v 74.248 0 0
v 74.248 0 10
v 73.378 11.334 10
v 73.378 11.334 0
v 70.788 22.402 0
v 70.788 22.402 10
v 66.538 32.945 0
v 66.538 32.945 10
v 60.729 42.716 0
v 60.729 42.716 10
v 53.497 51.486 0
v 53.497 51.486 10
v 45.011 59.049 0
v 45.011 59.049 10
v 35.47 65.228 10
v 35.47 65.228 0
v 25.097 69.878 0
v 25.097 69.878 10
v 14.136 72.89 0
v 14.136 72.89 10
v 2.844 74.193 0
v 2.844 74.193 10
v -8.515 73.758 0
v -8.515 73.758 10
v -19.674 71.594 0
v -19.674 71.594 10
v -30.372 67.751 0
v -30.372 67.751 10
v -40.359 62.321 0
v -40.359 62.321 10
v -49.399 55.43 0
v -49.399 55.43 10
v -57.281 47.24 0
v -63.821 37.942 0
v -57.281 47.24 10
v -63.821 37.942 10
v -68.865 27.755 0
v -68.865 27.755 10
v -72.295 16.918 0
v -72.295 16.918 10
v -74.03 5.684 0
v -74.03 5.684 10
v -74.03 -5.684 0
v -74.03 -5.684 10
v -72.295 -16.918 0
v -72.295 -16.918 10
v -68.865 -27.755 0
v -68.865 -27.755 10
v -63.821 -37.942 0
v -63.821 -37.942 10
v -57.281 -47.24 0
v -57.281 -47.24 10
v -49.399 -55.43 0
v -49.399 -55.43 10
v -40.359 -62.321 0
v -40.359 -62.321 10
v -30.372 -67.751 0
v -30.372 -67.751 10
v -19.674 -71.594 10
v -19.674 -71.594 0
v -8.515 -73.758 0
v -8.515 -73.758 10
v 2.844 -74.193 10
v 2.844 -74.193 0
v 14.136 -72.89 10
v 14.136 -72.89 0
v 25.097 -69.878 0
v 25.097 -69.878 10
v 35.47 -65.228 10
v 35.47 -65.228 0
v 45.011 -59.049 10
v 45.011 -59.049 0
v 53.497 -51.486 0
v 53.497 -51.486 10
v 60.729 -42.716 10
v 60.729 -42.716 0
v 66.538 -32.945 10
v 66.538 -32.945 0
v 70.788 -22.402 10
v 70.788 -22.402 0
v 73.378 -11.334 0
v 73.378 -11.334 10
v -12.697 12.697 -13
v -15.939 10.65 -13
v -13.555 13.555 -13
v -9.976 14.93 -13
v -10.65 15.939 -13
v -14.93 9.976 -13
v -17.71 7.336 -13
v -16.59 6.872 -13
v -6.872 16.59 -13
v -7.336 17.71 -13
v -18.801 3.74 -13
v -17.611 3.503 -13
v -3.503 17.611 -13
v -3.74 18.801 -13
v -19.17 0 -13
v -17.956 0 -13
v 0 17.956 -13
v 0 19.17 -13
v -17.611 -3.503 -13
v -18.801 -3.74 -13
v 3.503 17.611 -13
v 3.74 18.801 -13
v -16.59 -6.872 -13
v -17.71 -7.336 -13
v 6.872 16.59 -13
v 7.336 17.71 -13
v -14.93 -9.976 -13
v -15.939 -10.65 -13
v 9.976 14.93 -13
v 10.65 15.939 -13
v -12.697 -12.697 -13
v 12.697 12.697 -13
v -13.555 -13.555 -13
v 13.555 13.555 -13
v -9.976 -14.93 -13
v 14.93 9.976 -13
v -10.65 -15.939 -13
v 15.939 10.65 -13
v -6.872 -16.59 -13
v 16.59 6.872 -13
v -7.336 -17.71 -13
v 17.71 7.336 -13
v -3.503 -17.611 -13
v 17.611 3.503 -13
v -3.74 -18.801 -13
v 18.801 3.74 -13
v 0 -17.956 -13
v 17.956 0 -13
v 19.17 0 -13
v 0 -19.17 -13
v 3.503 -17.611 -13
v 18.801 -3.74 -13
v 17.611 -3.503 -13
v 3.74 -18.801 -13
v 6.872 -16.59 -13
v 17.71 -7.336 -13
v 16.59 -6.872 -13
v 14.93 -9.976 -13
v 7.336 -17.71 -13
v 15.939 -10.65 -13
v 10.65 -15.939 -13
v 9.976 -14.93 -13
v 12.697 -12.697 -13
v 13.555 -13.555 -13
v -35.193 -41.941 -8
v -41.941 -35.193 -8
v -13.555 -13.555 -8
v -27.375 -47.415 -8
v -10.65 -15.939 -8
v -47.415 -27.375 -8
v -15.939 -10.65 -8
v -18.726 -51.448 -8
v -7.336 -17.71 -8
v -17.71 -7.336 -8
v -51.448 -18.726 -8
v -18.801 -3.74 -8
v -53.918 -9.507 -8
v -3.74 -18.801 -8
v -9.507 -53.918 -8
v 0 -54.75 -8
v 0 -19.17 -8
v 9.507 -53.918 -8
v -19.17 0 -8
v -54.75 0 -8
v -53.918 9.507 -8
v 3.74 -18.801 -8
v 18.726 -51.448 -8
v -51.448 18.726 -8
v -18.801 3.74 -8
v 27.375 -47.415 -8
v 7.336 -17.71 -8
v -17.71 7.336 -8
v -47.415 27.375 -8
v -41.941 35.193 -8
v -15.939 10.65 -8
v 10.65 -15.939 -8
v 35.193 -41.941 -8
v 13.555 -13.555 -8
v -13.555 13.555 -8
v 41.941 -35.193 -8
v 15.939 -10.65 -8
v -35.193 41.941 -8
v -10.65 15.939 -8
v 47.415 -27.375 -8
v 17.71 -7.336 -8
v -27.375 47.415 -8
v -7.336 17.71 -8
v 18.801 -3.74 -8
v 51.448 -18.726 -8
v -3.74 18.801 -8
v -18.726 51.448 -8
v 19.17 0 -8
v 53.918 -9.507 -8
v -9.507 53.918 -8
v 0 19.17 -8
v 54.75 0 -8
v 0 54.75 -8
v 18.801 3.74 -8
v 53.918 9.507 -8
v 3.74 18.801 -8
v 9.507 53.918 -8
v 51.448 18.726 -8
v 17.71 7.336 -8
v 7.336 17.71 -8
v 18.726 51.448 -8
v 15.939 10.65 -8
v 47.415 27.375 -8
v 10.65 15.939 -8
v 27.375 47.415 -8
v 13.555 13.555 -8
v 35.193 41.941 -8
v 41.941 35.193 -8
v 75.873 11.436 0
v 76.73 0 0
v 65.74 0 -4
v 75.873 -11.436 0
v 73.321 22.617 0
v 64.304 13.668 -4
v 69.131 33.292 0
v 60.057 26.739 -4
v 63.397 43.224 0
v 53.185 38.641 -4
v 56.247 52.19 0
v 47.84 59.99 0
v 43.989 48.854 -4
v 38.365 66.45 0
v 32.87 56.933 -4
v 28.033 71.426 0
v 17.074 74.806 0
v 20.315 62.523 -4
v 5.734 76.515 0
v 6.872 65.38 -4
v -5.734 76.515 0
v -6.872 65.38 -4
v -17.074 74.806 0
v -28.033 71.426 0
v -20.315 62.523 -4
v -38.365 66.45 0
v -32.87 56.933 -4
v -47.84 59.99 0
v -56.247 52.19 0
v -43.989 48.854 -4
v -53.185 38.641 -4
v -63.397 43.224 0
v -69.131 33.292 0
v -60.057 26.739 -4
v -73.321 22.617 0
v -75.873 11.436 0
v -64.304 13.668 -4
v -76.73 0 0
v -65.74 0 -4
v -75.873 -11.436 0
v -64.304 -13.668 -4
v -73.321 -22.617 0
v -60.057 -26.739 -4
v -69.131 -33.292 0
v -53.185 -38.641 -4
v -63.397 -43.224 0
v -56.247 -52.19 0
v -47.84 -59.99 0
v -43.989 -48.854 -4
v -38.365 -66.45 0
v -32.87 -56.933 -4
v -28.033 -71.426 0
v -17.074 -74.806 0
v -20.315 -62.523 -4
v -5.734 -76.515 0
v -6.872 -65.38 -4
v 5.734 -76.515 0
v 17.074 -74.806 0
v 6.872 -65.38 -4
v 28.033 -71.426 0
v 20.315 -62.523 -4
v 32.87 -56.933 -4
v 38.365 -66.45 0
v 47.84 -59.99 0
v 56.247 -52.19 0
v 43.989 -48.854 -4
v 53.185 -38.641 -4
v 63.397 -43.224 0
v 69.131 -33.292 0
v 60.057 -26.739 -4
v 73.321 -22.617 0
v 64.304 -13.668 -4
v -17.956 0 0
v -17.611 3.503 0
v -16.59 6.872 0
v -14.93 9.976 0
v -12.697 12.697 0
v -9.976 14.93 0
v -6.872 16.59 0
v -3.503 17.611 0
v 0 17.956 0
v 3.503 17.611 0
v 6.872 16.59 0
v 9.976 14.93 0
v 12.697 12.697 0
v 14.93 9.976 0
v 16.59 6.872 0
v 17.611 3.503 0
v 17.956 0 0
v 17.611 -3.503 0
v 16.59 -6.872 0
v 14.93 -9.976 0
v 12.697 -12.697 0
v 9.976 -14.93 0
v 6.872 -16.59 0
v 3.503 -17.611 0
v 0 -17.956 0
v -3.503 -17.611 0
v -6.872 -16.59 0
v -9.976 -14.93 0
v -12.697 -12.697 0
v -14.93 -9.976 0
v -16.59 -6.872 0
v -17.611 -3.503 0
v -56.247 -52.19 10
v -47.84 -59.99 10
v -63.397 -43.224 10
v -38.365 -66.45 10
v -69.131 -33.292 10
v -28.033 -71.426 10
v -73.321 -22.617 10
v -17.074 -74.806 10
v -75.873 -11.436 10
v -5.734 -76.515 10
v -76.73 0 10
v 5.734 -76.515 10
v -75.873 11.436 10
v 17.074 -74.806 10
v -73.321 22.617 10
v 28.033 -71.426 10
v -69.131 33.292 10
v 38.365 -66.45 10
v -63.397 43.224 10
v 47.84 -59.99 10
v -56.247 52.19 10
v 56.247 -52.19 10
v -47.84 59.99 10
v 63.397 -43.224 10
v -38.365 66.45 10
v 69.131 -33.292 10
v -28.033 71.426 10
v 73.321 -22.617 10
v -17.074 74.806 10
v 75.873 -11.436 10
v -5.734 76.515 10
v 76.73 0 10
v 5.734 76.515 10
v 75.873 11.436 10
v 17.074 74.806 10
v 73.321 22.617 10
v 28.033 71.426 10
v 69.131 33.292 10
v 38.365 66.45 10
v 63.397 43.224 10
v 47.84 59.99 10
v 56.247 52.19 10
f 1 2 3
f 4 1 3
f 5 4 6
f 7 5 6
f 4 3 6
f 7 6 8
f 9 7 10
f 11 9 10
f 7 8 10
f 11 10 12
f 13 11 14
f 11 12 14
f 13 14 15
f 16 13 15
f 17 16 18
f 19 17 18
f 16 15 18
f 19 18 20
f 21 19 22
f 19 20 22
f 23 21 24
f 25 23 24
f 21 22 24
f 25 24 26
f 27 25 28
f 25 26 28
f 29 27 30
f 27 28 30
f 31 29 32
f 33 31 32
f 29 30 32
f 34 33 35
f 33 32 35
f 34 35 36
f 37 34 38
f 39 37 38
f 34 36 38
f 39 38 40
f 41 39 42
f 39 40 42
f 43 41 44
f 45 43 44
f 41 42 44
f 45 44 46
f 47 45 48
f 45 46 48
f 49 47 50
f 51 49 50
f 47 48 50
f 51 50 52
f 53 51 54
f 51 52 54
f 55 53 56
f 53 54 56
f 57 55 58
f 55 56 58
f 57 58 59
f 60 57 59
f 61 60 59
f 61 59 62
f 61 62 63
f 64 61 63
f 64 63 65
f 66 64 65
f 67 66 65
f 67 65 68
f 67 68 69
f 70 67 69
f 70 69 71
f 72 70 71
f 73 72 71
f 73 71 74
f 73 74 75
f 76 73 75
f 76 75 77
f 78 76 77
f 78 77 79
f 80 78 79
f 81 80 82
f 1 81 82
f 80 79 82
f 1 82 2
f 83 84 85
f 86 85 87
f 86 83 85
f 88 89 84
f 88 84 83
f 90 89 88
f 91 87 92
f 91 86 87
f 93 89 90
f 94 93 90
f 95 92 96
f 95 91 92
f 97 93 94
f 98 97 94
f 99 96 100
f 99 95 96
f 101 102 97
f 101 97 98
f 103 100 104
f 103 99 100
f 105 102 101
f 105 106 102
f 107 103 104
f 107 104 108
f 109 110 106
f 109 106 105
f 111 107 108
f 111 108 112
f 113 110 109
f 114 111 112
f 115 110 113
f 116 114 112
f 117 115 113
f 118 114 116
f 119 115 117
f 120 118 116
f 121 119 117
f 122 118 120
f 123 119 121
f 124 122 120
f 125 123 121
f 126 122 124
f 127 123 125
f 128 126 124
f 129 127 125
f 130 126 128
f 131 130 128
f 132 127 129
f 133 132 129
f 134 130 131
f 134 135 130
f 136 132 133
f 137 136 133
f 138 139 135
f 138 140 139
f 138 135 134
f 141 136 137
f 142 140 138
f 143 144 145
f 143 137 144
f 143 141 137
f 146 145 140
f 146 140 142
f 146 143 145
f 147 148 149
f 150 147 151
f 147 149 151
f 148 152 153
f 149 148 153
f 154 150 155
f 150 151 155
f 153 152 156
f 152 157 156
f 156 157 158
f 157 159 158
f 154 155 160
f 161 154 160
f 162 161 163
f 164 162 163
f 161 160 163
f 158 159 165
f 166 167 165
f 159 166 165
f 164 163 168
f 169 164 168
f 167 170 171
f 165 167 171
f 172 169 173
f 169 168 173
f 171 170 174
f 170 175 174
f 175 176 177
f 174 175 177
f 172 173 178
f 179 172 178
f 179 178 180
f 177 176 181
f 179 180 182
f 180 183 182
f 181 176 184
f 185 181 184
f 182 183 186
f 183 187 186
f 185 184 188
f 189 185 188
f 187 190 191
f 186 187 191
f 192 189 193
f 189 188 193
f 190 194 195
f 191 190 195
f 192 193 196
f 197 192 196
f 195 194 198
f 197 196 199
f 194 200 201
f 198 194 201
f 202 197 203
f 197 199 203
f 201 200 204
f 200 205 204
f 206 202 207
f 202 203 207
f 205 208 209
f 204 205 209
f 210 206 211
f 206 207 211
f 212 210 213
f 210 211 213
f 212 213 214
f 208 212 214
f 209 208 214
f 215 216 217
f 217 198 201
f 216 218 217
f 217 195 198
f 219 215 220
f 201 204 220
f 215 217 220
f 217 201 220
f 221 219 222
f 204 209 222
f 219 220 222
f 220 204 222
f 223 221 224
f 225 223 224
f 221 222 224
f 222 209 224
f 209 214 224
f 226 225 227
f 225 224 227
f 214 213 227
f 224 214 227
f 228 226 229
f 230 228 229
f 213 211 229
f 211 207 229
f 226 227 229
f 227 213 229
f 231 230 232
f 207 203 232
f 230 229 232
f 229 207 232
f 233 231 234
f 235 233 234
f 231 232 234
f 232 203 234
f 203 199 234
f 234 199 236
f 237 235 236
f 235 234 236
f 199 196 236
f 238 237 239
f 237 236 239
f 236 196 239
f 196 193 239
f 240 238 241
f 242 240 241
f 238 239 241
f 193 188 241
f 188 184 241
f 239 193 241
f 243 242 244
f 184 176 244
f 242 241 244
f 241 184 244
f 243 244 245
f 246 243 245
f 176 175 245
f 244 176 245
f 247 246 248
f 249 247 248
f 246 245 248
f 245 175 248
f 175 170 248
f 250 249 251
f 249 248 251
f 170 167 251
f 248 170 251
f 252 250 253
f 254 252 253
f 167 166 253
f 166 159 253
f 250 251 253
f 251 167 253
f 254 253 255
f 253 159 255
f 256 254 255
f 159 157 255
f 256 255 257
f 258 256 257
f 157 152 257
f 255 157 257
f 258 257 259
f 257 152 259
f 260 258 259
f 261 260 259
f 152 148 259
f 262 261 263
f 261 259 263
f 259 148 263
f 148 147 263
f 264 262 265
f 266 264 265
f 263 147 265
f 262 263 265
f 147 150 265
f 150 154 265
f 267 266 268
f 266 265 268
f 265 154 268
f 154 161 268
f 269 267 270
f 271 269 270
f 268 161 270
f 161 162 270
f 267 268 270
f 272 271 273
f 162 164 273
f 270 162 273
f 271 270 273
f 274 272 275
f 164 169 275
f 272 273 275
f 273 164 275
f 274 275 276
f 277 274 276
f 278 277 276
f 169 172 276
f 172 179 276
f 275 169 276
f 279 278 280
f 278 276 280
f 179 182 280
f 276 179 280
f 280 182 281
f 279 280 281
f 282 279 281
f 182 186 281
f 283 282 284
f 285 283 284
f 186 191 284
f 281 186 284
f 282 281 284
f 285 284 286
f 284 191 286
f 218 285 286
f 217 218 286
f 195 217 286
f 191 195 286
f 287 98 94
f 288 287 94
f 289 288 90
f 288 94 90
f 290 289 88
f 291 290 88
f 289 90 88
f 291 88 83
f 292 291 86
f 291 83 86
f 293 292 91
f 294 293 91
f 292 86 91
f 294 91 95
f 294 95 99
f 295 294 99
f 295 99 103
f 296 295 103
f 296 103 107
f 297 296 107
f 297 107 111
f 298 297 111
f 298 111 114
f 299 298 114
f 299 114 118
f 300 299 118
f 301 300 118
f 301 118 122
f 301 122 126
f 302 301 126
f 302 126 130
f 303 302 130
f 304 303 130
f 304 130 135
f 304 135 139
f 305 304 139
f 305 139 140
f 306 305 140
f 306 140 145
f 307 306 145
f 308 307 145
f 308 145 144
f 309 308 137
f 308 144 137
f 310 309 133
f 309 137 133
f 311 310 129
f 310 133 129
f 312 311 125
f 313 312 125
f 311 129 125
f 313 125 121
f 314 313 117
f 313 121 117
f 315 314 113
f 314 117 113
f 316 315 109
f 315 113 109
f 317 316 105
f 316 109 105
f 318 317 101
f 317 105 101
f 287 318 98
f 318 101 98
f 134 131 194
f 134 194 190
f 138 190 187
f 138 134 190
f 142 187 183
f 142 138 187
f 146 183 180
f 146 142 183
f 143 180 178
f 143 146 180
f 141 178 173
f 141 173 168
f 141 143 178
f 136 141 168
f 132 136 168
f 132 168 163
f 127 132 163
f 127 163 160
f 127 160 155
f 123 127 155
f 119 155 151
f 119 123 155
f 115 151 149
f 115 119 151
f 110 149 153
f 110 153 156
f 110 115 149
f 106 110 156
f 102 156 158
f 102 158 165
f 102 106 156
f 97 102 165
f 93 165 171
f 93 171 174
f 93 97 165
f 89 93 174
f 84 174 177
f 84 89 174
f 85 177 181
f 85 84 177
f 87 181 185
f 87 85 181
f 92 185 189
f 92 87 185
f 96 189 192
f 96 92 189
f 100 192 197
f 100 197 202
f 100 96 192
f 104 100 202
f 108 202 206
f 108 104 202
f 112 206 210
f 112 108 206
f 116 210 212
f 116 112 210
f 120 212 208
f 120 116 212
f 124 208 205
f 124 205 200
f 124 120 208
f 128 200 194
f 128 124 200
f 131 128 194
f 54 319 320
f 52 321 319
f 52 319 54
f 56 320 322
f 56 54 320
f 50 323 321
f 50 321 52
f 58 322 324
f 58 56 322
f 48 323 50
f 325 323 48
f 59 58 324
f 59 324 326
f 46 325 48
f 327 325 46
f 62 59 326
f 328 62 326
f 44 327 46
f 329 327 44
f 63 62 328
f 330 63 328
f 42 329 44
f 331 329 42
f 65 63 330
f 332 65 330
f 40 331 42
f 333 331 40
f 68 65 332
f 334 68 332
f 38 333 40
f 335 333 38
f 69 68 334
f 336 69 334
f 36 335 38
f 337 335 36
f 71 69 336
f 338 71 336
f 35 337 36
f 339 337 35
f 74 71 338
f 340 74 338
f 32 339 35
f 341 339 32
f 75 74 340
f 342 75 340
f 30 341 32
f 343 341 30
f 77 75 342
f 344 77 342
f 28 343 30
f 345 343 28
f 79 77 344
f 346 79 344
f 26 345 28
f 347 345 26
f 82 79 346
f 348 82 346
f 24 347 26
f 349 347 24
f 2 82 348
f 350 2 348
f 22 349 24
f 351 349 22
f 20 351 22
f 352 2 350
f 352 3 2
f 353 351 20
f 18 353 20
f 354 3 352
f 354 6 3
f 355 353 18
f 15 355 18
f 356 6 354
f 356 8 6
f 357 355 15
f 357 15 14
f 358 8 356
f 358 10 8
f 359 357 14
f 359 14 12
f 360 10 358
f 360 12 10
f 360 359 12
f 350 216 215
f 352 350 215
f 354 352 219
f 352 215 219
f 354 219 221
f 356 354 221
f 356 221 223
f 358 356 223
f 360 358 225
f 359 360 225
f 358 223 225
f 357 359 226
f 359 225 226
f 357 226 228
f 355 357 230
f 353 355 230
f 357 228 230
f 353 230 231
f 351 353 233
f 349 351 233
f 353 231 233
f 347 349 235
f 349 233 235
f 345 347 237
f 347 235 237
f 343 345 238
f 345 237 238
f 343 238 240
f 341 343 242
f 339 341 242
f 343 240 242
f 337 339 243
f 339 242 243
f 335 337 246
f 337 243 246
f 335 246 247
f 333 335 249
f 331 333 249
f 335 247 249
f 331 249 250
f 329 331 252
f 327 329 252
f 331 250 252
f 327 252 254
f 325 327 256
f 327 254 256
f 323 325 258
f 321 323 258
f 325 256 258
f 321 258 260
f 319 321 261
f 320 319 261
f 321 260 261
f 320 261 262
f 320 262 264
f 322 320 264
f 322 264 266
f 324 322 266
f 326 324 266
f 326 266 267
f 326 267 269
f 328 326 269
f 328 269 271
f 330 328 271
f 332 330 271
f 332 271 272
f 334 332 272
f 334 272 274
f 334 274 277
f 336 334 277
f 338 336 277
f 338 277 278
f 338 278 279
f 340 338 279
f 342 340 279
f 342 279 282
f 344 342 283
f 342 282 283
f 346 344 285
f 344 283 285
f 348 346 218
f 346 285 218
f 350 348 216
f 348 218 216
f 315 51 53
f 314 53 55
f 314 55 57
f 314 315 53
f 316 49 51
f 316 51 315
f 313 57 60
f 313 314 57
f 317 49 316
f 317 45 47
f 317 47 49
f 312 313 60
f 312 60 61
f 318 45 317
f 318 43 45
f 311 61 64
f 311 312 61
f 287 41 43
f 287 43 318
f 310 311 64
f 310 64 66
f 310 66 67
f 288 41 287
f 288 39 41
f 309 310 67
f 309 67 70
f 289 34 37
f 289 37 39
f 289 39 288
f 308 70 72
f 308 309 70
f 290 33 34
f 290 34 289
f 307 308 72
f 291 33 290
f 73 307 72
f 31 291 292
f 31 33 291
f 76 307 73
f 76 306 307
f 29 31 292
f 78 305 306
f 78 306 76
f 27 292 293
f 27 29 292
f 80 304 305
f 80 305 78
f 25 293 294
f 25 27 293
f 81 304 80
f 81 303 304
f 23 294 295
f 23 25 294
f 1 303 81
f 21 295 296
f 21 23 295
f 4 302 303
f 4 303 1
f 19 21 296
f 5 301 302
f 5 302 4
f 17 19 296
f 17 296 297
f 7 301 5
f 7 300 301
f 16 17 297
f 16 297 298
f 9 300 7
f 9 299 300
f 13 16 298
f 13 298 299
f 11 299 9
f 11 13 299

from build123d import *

# Parameters (mm, degrees)
SKETCH1_R                     = 76.73
BOSS_EXTRUDE1_DEPTH           = 10
BOSS_EXTRUDE1_OTHER_WAY_DEPTH = 8
BOSS_EXTRUDE1_OTHER_WAY_TAPER = 70
SKETCH2_R                     = 17.9565
CUT_EXTRUDE1_DEPTH            = 18
SKETCH3_R                     = 74.247849381
CUT_EXTRUDE2_DEPTH            = 10
BOSS_EXTRUDE2_START           = 5
SKETCH4_R                     = 19.169573719
SKETCH4_R_2                   = 17.9565
BOSS_EXTRUDE2_DEPTH           = 5


with BuildPart() as part:
    # Sketch1 → Boss-Extrude1 (new body)
    with BuildSketch(Plane.XY):
        Circle(SKETCH1_R)
    extrude(amount=BOSS_EXTRUDE1_DEPTH)

    # Sketch1 → Boss-Extrude1 other way (add)
    with BuildSketch(Plane.XY):
        Circle(SKETCH1_R)
    extrude(amount=-BOSS_EXTRUDE1_OTHER_WAY_DEPTH, taper=BOSS_EXTRUDE1_OTHER_WAY_TAPER)

    # Sketch2 → Cut-Extrude1 (cut)
    with BuildSketch(Plane(origin=(0, 0, -8), x_dir=(-1, 0, 0), z_dir=(0, 0, -1))):
        Circle(SKETCH2_R)
    extrude(amount=-CUT_EXTRUDE1_DEPTH, mode=Mode.SUBTRACT)

    # Sketch3 → Cut-Extrude2 (cut)
    with BuildSketch(Plane.XY.offset(10)):
        Circle(SKETCH3_R)
    extrude(amount=-CUT_EXTRUDE2_DEPTH, mode=Mode.SUBTRACT)

    # Sketch4 → Boss-Extrude2 (add)
    with BuildSketch(Plane(origin=(0, 0, -8), x_dir=(-1, 0, 0), z_dir=(0, 0, -1)).offset(BOSS_EXTRUDE2_START)):
        with Locations(Location((0, 0, 0), (0, 0, 180))):
            Circle(SKETCH4_R)
        Circle(SKETCH4_R_2, mode=Mode.SUBTRACT)
    extrude(amount=-BOSS_EXTRUDE2_DEPTH)


solid = part.part
